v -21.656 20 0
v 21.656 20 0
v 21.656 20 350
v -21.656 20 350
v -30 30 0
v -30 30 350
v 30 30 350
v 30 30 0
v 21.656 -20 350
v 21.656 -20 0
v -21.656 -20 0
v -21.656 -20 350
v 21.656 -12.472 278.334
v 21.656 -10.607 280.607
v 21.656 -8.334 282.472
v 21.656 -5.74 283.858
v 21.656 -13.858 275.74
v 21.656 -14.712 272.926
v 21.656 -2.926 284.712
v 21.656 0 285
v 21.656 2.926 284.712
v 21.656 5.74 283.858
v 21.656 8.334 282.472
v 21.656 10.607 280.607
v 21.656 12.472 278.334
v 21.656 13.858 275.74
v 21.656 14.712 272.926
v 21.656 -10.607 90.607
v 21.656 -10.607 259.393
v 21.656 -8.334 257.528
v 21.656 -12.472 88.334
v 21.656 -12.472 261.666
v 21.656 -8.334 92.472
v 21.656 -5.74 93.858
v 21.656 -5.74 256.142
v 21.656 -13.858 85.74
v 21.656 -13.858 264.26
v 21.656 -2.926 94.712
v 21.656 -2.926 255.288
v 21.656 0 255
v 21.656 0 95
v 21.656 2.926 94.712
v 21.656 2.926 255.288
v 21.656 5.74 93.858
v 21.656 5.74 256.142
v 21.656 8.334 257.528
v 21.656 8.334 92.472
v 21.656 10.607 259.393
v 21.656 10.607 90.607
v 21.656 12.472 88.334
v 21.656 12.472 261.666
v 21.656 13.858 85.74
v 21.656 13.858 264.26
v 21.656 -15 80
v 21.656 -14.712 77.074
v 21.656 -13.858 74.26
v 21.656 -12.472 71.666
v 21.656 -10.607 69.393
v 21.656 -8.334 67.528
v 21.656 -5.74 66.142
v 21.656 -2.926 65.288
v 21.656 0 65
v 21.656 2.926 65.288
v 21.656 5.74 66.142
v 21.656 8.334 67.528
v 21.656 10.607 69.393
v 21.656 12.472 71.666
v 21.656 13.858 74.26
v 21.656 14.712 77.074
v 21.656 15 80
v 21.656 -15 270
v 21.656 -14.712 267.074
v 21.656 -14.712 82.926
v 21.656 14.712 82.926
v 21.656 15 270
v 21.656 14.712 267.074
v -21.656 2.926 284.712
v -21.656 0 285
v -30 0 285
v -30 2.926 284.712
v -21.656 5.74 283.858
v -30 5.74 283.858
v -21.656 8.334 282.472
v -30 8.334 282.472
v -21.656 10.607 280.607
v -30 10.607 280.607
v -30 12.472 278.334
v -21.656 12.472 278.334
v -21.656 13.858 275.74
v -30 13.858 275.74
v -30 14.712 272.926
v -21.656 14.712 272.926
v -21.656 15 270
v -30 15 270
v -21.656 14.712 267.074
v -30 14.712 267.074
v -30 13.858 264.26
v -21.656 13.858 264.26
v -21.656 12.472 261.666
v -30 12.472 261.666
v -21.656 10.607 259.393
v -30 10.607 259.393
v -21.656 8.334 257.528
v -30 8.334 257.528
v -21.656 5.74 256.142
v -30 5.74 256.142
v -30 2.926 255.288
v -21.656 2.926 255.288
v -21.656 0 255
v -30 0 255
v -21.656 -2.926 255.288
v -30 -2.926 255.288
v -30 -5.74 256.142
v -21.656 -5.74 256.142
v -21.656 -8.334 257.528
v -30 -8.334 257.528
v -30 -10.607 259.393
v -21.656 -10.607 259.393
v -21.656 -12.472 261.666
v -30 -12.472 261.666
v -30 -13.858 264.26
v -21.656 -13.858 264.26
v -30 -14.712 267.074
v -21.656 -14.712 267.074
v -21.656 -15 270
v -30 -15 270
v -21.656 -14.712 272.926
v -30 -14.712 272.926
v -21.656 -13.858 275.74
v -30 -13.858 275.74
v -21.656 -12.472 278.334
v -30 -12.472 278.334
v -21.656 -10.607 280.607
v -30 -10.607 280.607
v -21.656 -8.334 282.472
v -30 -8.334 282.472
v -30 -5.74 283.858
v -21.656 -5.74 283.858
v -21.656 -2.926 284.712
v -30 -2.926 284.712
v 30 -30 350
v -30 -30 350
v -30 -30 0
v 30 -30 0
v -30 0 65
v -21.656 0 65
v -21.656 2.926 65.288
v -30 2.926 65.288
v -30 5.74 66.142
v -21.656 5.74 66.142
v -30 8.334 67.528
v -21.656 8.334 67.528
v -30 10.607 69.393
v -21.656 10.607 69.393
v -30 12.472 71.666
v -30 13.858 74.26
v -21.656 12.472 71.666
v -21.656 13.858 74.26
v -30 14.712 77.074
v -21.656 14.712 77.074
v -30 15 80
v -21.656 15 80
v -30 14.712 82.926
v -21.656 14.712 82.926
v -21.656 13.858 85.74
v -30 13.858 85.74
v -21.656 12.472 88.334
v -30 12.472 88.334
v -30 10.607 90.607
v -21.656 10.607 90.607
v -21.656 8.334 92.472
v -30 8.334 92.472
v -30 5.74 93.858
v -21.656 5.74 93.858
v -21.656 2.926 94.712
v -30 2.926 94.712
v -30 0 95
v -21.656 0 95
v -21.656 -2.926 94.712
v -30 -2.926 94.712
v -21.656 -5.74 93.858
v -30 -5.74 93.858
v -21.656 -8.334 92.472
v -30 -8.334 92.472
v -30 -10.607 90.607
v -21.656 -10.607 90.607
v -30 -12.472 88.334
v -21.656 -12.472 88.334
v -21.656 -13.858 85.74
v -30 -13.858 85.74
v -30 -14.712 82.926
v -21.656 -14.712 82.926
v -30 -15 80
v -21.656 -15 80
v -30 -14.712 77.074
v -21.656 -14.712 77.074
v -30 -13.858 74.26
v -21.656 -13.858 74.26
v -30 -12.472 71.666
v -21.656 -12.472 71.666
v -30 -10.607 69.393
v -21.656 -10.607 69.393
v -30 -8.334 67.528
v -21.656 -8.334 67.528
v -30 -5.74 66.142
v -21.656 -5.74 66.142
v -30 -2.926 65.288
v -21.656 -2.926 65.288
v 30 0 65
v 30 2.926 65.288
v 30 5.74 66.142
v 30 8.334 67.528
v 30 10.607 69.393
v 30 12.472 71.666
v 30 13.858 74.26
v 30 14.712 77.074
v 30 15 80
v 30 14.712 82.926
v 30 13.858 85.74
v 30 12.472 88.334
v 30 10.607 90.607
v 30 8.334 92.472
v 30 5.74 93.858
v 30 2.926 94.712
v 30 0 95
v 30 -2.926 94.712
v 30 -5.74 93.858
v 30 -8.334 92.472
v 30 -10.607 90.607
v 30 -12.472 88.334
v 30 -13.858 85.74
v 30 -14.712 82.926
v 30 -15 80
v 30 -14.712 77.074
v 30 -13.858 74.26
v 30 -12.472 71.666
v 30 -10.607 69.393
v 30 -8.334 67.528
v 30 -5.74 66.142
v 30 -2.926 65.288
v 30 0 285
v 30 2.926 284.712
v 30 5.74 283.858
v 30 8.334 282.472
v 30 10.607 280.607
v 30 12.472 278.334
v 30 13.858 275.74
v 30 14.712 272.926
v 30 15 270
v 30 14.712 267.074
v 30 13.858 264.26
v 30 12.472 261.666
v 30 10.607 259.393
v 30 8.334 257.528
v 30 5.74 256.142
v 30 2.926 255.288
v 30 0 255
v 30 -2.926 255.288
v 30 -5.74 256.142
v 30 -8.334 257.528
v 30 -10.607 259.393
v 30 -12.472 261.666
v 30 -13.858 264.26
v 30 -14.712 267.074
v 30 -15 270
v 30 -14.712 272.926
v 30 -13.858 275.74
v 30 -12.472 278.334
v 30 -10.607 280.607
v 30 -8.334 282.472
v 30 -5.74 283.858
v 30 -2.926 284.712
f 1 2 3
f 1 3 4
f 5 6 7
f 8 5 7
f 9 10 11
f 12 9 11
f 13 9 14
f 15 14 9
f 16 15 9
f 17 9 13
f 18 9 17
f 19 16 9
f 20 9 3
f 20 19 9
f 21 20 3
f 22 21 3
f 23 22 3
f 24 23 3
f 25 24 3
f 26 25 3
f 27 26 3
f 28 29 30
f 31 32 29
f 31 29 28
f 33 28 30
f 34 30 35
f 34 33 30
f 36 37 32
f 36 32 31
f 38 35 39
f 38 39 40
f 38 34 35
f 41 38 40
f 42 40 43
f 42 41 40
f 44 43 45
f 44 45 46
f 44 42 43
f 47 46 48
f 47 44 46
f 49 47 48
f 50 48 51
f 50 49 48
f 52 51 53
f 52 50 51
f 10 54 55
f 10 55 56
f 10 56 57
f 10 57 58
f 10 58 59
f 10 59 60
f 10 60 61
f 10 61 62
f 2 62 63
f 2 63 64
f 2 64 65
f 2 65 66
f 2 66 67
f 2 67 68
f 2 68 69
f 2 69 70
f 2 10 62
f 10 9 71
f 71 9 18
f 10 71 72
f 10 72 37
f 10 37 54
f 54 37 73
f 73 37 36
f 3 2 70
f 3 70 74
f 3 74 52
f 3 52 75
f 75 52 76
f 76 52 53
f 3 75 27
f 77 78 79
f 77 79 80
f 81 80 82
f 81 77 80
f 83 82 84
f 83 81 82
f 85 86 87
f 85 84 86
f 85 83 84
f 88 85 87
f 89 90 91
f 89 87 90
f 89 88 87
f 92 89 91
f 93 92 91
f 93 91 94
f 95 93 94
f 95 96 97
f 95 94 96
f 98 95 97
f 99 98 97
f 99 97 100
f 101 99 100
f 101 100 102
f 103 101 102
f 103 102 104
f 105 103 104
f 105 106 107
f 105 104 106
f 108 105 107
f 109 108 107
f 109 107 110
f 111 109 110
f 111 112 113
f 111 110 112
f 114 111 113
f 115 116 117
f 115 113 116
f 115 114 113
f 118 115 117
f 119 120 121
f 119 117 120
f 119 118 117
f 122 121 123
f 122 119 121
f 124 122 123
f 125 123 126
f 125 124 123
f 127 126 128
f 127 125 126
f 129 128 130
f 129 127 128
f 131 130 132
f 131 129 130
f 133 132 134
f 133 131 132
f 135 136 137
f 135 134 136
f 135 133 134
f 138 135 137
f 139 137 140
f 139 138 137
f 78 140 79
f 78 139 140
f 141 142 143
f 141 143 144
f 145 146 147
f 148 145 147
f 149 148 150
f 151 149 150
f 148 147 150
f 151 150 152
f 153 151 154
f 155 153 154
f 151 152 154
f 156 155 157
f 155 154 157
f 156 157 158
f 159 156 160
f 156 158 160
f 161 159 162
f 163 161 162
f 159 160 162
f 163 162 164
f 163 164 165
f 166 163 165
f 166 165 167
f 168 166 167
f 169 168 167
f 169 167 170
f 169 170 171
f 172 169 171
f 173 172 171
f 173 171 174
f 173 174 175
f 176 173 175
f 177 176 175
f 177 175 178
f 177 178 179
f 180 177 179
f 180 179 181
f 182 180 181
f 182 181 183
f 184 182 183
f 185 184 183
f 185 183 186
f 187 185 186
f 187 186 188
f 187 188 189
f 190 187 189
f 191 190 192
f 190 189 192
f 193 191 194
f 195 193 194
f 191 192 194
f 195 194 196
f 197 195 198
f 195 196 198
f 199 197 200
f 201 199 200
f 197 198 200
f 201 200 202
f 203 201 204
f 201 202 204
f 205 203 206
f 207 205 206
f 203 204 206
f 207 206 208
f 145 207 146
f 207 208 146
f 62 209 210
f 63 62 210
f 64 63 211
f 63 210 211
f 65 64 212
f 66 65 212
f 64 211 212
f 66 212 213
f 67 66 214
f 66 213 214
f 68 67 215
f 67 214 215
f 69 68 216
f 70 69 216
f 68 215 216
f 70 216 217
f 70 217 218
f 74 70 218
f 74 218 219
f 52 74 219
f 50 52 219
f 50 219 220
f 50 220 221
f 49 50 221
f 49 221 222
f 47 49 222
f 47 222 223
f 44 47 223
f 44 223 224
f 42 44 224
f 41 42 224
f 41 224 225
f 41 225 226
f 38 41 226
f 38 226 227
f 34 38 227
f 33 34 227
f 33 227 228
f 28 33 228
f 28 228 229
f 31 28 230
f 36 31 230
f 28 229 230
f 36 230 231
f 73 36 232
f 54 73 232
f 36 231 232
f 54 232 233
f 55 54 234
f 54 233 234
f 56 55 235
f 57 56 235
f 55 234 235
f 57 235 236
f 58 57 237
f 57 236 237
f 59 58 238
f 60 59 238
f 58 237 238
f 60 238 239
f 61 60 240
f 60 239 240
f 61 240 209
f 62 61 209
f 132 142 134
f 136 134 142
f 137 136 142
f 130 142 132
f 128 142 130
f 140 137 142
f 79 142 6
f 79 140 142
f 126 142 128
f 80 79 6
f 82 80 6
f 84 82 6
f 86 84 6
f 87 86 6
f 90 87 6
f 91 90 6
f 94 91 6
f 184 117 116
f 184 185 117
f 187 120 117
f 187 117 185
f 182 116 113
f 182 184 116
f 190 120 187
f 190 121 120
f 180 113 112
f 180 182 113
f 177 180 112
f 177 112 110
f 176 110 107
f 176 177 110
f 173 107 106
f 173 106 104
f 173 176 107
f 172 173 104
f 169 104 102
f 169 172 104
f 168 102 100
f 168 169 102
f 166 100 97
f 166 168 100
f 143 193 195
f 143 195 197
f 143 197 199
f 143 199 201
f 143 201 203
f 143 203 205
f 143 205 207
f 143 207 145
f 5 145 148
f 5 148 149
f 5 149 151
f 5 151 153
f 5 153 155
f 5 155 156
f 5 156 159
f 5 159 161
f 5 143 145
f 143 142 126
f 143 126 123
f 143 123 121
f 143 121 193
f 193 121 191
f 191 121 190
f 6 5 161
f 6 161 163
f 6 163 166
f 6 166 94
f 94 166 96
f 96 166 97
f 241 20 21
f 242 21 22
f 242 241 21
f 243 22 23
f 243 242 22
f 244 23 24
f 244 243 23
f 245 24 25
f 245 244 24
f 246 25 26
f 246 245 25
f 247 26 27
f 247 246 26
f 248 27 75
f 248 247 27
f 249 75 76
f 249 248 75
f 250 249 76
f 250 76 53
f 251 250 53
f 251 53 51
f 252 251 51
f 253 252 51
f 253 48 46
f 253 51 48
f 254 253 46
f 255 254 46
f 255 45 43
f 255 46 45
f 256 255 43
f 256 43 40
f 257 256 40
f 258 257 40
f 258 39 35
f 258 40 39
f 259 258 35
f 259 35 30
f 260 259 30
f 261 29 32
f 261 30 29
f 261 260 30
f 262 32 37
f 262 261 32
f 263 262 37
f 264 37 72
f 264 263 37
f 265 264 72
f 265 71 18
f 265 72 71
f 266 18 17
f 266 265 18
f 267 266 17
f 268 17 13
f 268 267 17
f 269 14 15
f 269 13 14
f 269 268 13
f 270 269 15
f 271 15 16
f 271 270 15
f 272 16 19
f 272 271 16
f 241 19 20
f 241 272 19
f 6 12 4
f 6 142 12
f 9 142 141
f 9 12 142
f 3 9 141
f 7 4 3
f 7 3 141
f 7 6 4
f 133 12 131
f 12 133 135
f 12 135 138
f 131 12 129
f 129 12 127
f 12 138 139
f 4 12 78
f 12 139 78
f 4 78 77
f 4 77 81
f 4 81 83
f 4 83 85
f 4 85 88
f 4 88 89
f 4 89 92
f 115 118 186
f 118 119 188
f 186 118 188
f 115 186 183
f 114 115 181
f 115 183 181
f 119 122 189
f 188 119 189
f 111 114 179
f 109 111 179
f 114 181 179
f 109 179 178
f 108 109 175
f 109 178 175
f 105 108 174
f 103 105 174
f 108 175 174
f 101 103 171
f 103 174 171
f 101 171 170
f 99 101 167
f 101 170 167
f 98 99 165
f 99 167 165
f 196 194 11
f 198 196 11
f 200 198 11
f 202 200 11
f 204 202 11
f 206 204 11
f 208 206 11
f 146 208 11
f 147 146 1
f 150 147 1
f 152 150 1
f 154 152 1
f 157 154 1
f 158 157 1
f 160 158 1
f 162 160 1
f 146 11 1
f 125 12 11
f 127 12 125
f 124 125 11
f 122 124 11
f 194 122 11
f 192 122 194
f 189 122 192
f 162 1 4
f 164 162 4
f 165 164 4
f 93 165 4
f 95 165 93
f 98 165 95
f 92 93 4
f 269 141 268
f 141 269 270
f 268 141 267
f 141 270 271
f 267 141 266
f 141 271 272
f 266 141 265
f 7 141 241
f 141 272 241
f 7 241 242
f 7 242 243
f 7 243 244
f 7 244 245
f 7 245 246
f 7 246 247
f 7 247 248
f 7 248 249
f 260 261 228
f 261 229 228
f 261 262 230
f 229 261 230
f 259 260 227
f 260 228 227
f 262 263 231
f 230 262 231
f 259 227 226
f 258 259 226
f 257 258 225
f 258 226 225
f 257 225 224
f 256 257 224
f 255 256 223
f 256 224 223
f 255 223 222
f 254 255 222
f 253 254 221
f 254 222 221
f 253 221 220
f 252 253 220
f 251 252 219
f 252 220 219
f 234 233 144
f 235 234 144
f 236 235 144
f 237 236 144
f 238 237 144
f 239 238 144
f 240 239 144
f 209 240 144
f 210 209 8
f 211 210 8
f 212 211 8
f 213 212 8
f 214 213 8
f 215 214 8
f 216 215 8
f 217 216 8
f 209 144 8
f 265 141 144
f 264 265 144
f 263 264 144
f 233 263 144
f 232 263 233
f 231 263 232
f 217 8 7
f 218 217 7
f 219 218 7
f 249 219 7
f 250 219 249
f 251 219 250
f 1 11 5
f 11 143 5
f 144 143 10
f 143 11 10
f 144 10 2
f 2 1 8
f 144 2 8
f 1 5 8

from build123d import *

# Parameters (mm, degrees)
SKETCH1_W           = 60
SKETCH1_H           = 60
BOSS_EXTRUDE1_DEPTH = 350
SKETCH3_W           = 43.312374626
SKETCH3_H           = 40
CUT_EXTRUDE2_DEPTH  = 375
SKETCH4_R           = 15
CUT_EXTRUDE3_DEPTH  = 375


with BuildPart() as part:
    # Sketch1 → Boss-Extrude1 (new body)
    with BuildSketch(Plane.XY):
        Rectangle(SKETCH1_W, SKETCH1_H)
    extrude(amount=BOSS_EXTRUDE1_DEPTH)

    # Sketch3 → Cut-Extrude2 (cut)
    with BuildSketch(Plane(origin=(0, 0, 0), x_dir=(-1, 0, 0), z_dir=(0, 0, -1))):
        Rectangle(SKETCH3_W, SKETCH3_H)
    extrude(amount=-CUT_EXTRUDE2_DEPTH, mode=Mode.SUBTRACT)

    # Sketch4 → Cut-Extrude3 (cut)
    with BuildSketch(Plane(origin=(30, 0, 0), x_dir=(0, 0, -1), z_dir=(1, 0, 0))):
        with Locations((-80, 0)):
            Circle(SKETCH4_R)
    cut_extrude3 = extrude(amount=-CUT_EXTRUDE3_DEPTH, mode=Mode.SUBTRACT)

    # Mirror1: Cut-Extrude3 across plane
    add(cut_extrude3.mirror(Plane(origin=(0, 0, 175), x_dir=(1, 0, 0), z_dir=(0, 0, -1))), mode=Mode.SUBTRACT)


solid = part.part
